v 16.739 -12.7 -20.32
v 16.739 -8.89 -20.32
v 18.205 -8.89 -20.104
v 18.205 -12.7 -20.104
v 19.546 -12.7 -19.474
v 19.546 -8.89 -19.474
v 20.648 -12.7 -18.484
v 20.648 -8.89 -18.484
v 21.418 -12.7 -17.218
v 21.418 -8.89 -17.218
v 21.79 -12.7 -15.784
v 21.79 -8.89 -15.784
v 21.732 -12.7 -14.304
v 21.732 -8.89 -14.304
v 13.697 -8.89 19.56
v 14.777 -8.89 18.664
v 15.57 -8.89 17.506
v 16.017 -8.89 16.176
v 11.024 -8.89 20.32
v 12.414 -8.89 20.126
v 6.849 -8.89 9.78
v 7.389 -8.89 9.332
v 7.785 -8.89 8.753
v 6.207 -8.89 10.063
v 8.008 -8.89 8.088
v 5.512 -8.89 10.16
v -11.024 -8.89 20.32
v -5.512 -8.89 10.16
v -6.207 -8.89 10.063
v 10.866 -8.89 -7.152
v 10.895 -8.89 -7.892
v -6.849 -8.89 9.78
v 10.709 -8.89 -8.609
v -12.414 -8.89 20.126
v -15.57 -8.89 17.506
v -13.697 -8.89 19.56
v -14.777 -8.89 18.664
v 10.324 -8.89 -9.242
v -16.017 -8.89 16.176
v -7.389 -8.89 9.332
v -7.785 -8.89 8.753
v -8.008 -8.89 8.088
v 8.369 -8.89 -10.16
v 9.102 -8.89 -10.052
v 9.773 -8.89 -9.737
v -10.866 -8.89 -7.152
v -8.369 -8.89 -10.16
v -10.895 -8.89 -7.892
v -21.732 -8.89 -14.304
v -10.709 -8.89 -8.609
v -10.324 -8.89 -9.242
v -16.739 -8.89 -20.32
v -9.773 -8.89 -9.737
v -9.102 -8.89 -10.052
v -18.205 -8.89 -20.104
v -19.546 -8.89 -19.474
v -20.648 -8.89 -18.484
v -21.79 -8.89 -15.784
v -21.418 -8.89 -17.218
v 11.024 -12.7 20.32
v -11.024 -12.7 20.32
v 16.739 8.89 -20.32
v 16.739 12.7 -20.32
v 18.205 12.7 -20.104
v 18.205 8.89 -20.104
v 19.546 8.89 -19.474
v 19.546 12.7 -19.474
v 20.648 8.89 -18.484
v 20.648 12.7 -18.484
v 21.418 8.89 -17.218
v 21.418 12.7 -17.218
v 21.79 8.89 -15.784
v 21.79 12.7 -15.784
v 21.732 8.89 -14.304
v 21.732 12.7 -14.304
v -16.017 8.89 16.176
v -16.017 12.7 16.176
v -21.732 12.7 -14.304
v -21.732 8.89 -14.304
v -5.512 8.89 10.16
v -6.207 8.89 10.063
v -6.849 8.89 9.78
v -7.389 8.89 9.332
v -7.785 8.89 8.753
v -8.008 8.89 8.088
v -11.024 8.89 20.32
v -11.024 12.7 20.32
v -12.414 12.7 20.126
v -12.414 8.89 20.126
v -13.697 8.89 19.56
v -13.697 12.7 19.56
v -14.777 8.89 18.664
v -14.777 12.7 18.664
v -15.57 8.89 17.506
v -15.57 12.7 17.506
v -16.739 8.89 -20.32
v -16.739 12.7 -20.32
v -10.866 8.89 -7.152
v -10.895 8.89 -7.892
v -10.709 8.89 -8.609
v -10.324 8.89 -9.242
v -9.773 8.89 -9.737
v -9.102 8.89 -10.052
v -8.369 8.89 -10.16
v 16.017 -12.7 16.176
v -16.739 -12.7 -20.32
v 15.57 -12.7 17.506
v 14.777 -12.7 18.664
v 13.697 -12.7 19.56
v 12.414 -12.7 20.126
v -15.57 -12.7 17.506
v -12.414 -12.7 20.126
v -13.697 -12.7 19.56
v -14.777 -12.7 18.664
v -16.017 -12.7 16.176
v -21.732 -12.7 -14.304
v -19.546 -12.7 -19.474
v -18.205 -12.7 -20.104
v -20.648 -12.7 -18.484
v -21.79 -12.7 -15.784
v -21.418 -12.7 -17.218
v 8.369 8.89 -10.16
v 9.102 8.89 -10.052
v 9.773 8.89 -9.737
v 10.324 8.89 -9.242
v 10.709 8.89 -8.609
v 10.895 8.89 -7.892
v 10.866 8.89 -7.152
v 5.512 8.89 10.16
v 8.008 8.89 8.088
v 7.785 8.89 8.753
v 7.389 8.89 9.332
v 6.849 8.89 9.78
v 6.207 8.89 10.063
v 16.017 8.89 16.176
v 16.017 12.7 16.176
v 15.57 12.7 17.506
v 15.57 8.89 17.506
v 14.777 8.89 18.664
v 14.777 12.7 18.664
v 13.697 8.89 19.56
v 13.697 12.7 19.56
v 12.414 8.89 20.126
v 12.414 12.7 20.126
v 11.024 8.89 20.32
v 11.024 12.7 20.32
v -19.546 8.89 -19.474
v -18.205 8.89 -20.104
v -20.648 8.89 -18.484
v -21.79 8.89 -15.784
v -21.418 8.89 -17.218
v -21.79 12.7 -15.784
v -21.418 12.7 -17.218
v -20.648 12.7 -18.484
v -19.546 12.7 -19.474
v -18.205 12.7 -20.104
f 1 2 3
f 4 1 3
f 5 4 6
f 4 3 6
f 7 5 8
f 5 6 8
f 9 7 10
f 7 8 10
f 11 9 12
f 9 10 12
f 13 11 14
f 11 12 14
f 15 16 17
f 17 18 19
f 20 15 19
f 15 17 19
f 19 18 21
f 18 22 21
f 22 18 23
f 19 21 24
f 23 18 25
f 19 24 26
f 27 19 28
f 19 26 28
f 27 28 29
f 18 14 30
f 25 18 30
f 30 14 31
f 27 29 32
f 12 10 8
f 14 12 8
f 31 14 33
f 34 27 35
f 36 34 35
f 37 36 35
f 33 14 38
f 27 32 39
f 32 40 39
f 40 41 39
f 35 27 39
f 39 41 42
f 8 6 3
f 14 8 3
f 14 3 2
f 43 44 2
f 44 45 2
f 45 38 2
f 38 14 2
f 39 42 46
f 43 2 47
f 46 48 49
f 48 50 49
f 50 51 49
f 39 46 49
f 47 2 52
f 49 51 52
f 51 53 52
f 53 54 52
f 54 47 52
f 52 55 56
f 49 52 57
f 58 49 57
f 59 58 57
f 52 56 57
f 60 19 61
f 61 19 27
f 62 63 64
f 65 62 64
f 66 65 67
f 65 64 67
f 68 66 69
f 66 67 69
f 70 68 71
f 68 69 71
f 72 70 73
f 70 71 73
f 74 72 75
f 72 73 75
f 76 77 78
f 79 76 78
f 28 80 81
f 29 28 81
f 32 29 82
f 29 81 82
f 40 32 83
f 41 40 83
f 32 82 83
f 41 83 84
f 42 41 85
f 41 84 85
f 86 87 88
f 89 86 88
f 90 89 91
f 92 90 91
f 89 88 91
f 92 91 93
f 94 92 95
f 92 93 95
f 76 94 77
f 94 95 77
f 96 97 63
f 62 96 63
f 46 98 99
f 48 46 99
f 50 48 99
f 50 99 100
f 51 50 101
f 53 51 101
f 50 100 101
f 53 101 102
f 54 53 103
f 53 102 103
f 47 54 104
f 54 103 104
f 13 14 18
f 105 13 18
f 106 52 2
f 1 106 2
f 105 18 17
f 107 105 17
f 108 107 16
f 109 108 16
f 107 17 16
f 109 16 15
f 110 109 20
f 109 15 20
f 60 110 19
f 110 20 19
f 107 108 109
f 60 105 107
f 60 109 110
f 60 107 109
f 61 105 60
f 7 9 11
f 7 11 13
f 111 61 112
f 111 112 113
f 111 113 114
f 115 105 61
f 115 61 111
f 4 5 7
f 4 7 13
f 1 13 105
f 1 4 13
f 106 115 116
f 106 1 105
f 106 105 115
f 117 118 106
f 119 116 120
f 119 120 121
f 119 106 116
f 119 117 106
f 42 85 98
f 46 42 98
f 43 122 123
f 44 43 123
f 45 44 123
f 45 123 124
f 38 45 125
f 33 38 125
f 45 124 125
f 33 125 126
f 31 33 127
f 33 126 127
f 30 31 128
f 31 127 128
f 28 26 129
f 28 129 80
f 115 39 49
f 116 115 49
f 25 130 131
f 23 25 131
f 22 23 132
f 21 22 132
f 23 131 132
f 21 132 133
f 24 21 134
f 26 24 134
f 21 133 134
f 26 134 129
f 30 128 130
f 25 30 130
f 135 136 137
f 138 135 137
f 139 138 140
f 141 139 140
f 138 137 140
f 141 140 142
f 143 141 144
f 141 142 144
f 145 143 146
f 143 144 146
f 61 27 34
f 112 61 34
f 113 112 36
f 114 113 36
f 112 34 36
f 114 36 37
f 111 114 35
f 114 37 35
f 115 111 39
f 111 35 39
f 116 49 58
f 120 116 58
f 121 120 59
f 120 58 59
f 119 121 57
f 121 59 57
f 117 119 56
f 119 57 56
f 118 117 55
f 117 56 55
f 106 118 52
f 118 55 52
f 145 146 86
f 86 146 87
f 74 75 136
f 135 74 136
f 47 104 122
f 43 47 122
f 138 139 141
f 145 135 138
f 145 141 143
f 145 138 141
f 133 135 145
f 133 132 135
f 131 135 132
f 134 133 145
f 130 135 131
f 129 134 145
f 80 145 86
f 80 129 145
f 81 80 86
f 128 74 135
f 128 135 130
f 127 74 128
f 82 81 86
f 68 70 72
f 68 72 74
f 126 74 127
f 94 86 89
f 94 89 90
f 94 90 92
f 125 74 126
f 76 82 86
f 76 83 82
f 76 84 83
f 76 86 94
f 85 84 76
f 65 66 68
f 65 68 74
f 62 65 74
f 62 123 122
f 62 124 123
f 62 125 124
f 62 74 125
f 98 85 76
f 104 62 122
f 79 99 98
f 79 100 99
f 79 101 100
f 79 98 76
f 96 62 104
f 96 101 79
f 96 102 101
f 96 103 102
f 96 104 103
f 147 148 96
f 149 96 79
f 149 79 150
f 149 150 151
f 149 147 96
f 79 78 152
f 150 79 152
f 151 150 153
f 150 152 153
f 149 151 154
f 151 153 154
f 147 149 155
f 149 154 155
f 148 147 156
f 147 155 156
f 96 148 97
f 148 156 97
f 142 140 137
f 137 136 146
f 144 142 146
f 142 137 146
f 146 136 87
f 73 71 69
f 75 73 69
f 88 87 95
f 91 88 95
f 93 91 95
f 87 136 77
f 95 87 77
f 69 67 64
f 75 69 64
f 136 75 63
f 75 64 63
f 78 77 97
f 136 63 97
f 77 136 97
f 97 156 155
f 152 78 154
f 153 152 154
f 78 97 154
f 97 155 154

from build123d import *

# Parameters (mm, degrees)
BOSS_EXTRUDE1_DEPTH = 12.7
CUT_EXTRUDE1_DEPTH  = 8.89


with BuildPart() as part:
    # Sketch1 → Boss-Extrude1 (new, symmetric)
    with BuildSketch(Plane(origin=(0, 0, 0), x_dir=(1, 0, 0), z_dir=(0, 1, 0))):
        with BuildLine():
            Line((-16.738974461, 20.32), (16.738974461, 20.32))
            ThreePointArc((16.738974461, 20.32), (20.64808073, 18.484270053), (21.73196517, 14.303814242))
            Line((21.73196517, 14.303814242), (16.01696517, -16.176185758))
            ThreePointArc((16.01696517, -16.176185758), (14.268244513, -19.149106269), (11.023974461, -20.32))
            Line((11.023974461, -20.32), (-11.023974461, -20.32))
            ThreePointArc((-11.023974461, -20.32), (-14.268244513, -19.149106269), (-16.01696517, -16.176185758))
            Line((-16.01696517, -16.176185758), (-21.73196517, 14.303814242))
            ThreePointArc((-21.73196517, 14.303814242), (-20.64808073, 18.484270053), (-16.738974461, 20.32))
        make_face()
    extrude(amount=BOSS_EXTRUDE1_DEPTH, both=True)

    # Sketch3 → Cut-Extrude1 (cut, symmetric)
    with BuildSketch(Plane(origin=(0, 0, 0), x_dir=(1, 0, 0), z_dir=(0, 1, 0))):
        with BuildLine():
            Line((-16.738974461, 20.32), (16.738974461, 20.32))
            ThreePointArc((16.738974461, 20.32), (20.64808073, 18.484270053), (21.73196517, 14.303814242))
            Line((21.73196517, 14.303814242), (16.01696517, -16.176185758))
            ThreePointArc((16.01696517, -16.176185758), (14.268244513, -19.149106269), (11.023974461, -20.32))
            Line((11.023974461, -20.32), (-11.023974461, -20.32))
            ThreePointArc((-11.023974461, -20.32), (-14.268244513, -19.149106269), (-16.01696517, -16.176185758))
            Line((-16.01696517, -16.176185758), (-21.73196517, 14.303814242))
            ThreePointArc((-21.73196517, 14.303814242), (-20.64808073, 18.484270053), (-16.738974461, 20.32))
        make_face()
        with BuildLine():
            Line((5.51198723, -10.16), (-5.51198723, -10.16))
            ThreePointArc((-5.51198723, -10.16), (-7.134122257, -9.574553135), (-8.008482585, -8.088092879))
            Line((-8.008482585, -8.088092879), (-10.865982585, 7.151907121))
            ThreePointArc((-10.865982585, 7.151907121), (-10.324040365, 9.242135026), (-8.36948723, 10.16))
            Line((-8.36948723, 10.16), (8.36948723, 10.16))
            ThreePointArc((8.36948723, 10.16), (10.324040365, 9.242135026), (10.865982585, 7.151907121))
            Line((10.865982585, 7.151907121), (8.008482585, -8.088092879))
            ThreePointArc((8.008482585, -8.088092879), (7.134122257, -9.574553135), (5.51198723, -10.16))
        make_face(mode=Mode.SUBTRACT)
    extrude(amount=CUT_EXTRUDE1_DEPTH, both=True, mode=Mode.SUBTRACT)


solid = part.part
